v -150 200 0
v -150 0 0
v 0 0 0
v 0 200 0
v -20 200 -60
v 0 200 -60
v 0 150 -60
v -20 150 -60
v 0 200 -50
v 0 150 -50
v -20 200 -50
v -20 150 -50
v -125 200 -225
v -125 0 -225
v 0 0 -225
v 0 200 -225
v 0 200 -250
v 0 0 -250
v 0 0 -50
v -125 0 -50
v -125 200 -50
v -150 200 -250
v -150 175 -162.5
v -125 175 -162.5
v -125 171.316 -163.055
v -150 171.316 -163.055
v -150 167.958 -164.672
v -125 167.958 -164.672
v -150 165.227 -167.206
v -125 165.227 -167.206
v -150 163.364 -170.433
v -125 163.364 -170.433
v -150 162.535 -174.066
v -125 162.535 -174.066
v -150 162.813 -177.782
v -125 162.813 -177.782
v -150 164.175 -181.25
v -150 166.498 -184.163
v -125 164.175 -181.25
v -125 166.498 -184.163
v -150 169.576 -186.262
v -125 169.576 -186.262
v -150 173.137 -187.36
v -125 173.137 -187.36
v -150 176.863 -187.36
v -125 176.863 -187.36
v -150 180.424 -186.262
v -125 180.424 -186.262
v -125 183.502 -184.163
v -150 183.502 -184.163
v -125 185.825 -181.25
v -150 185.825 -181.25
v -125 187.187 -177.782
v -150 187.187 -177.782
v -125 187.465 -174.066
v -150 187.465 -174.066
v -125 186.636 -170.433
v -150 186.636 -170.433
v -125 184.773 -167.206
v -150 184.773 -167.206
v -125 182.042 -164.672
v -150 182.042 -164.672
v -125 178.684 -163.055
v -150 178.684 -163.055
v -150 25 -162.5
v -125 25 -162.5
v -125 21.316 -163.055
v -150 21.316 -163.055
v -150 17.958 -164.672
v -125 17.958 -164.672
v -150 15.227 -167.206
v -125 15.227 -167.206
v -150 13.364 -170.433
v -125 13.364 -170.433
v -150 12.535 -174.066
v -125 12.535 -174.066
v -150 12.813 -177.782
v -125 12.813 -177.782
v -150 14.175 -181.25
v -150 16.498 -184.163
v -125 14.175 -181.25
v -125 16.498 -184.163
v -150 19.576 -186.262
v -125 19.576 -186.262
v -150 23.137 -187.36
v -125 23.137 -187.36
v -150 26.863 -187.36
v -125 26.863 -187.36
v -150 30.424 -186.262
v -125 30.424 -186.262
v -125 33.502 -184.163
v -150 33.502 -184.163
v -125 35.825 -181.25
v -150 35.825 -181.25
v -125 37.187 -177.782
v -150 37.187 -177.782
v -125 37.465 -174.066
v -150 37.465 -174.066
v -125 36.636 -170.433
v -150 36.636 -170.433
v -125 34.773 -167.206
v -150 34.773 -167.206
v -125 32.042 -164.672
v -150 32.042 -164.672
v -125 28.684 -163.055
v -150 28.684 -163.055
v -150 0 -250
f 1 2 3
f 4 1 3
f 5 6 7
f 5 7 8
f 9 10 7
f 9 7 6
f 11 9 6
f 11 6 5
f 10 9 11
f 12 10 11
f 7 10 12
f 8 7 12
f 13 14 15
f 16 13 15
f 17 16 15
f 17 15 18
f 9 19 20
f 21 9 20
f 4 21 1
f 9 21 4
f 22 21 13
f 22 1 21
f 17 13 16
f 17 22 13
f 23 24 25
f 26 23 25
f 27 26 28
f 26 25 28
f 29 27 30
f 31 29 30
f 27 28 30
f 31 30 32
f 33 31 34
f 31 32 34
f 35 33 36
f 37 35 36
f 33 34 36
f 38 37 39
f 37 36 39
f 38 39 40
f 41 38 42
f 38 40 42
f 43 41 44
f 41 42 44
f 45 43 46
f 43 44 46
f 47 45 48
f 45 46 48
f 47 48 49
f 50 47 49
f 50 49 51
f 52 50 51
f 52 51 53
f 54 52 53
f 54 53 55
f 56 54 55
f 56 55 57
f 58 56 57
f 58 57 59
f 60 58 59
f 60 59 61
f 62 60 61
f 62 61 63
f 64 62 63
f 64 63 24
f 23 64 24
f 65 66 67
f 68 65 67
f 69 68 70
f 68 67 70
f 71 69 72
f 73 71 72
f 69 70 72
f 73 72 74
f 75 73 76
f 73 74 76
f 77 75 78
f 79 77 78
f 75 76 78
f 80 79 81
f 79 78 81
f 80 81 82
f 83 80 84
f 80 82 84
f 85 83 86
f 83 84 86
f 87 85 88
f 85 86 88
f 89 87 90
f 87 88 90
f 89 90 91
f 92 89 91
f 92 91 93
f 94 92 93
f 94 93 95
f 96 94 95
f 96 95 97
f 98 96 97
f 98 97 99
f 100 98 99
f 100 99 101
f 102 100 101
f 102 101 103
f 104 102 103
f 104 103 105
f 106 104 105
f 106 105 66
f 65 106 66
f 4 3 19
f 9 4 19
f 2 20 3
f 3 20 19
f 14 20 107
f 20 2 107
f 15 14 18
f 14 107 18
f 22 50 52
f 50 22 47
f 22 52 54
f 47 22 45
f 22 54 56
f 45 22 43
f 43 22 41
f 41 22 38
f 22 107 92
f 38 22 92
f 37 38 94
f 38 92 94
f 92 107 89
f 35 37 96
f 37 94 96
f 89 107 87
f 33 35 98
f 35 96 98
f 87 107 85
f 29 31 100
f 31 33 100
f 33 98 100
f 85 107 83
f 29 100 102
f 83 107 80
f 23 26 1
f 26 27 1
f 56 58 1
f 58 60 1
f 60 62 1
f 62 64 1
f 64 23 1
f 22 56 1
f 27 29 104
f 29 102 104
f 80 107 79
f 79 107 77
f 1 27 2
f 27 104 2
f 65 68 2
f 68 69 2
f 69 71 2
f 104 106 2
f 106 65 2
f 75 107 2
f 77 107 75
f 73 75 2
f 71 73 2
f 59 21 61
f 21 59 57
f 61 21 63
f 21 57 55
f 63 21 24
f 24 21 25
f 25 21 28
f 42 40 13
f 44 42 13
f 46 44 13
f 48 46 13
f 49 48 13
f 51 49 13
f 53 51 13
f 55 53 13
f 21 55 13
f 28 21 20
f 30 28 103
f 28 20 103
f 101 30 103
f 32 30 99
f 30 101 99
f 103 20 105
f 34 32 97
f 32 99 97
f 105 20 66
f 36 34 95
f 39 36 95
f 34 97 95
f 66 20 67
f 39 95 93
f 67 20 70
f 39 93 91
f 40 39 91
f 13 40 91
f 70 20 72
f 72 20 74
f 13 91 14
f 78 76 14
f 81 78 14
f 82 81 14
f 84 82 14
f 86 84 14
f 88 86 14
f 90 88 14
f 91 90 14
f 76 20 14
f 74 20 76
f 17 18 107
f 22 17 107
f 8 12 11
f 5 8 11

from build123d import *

# Parameters (mm, degrees)
BOSS_EXTRUDE1_DEPTH = 200
HOLE1_D             = 25
SKETCH4_W           = 20
SKETCH4_H           = 50
BOSS_EXTRUDE2_DEPTH = 10


with BuildPart() as part:
    # Sketch1 → Boss-Extrude1 (new body)
    with BuildSketch(Plane(origin=(0, 0, 0), x_dir=(1, 0, 0), z_dir=(0, 1, 0))):
        Polygon((0, 225), (0, 250), (-150, 250), (-150, 0), (0, 0), (0, 50), (-125, 50), (-125, 225), align=None)
    extrude(amount=BOSS_EXTRUDE1_DEPTH)

    # Hole1 (through all)
    with Locations(Plane(origin=(-150, 175, -175), x_dir=(0, 0, -1), z_dir=(-1, 0, 0))):
        with Locations((0, 0), (0, 150)):
            Hole(HOLE1_D / 2)


with BuildPart() as body_2:
    # Sketch4 → Boss-Extrude2 (new body)
    with BuildSketch(Plane(origin=(0, 0, -50), x_dir=(-1, 0, 0), z_dir=(0, 0, -1))):
        with Locations((10, 175)):
            Rectangle(SKETCH4_W, SKETCH4_H)
    extrude(amount=BOSS_EXTRUDE2_DEPTH)


solid = Compound([part.part, body_2.part])
